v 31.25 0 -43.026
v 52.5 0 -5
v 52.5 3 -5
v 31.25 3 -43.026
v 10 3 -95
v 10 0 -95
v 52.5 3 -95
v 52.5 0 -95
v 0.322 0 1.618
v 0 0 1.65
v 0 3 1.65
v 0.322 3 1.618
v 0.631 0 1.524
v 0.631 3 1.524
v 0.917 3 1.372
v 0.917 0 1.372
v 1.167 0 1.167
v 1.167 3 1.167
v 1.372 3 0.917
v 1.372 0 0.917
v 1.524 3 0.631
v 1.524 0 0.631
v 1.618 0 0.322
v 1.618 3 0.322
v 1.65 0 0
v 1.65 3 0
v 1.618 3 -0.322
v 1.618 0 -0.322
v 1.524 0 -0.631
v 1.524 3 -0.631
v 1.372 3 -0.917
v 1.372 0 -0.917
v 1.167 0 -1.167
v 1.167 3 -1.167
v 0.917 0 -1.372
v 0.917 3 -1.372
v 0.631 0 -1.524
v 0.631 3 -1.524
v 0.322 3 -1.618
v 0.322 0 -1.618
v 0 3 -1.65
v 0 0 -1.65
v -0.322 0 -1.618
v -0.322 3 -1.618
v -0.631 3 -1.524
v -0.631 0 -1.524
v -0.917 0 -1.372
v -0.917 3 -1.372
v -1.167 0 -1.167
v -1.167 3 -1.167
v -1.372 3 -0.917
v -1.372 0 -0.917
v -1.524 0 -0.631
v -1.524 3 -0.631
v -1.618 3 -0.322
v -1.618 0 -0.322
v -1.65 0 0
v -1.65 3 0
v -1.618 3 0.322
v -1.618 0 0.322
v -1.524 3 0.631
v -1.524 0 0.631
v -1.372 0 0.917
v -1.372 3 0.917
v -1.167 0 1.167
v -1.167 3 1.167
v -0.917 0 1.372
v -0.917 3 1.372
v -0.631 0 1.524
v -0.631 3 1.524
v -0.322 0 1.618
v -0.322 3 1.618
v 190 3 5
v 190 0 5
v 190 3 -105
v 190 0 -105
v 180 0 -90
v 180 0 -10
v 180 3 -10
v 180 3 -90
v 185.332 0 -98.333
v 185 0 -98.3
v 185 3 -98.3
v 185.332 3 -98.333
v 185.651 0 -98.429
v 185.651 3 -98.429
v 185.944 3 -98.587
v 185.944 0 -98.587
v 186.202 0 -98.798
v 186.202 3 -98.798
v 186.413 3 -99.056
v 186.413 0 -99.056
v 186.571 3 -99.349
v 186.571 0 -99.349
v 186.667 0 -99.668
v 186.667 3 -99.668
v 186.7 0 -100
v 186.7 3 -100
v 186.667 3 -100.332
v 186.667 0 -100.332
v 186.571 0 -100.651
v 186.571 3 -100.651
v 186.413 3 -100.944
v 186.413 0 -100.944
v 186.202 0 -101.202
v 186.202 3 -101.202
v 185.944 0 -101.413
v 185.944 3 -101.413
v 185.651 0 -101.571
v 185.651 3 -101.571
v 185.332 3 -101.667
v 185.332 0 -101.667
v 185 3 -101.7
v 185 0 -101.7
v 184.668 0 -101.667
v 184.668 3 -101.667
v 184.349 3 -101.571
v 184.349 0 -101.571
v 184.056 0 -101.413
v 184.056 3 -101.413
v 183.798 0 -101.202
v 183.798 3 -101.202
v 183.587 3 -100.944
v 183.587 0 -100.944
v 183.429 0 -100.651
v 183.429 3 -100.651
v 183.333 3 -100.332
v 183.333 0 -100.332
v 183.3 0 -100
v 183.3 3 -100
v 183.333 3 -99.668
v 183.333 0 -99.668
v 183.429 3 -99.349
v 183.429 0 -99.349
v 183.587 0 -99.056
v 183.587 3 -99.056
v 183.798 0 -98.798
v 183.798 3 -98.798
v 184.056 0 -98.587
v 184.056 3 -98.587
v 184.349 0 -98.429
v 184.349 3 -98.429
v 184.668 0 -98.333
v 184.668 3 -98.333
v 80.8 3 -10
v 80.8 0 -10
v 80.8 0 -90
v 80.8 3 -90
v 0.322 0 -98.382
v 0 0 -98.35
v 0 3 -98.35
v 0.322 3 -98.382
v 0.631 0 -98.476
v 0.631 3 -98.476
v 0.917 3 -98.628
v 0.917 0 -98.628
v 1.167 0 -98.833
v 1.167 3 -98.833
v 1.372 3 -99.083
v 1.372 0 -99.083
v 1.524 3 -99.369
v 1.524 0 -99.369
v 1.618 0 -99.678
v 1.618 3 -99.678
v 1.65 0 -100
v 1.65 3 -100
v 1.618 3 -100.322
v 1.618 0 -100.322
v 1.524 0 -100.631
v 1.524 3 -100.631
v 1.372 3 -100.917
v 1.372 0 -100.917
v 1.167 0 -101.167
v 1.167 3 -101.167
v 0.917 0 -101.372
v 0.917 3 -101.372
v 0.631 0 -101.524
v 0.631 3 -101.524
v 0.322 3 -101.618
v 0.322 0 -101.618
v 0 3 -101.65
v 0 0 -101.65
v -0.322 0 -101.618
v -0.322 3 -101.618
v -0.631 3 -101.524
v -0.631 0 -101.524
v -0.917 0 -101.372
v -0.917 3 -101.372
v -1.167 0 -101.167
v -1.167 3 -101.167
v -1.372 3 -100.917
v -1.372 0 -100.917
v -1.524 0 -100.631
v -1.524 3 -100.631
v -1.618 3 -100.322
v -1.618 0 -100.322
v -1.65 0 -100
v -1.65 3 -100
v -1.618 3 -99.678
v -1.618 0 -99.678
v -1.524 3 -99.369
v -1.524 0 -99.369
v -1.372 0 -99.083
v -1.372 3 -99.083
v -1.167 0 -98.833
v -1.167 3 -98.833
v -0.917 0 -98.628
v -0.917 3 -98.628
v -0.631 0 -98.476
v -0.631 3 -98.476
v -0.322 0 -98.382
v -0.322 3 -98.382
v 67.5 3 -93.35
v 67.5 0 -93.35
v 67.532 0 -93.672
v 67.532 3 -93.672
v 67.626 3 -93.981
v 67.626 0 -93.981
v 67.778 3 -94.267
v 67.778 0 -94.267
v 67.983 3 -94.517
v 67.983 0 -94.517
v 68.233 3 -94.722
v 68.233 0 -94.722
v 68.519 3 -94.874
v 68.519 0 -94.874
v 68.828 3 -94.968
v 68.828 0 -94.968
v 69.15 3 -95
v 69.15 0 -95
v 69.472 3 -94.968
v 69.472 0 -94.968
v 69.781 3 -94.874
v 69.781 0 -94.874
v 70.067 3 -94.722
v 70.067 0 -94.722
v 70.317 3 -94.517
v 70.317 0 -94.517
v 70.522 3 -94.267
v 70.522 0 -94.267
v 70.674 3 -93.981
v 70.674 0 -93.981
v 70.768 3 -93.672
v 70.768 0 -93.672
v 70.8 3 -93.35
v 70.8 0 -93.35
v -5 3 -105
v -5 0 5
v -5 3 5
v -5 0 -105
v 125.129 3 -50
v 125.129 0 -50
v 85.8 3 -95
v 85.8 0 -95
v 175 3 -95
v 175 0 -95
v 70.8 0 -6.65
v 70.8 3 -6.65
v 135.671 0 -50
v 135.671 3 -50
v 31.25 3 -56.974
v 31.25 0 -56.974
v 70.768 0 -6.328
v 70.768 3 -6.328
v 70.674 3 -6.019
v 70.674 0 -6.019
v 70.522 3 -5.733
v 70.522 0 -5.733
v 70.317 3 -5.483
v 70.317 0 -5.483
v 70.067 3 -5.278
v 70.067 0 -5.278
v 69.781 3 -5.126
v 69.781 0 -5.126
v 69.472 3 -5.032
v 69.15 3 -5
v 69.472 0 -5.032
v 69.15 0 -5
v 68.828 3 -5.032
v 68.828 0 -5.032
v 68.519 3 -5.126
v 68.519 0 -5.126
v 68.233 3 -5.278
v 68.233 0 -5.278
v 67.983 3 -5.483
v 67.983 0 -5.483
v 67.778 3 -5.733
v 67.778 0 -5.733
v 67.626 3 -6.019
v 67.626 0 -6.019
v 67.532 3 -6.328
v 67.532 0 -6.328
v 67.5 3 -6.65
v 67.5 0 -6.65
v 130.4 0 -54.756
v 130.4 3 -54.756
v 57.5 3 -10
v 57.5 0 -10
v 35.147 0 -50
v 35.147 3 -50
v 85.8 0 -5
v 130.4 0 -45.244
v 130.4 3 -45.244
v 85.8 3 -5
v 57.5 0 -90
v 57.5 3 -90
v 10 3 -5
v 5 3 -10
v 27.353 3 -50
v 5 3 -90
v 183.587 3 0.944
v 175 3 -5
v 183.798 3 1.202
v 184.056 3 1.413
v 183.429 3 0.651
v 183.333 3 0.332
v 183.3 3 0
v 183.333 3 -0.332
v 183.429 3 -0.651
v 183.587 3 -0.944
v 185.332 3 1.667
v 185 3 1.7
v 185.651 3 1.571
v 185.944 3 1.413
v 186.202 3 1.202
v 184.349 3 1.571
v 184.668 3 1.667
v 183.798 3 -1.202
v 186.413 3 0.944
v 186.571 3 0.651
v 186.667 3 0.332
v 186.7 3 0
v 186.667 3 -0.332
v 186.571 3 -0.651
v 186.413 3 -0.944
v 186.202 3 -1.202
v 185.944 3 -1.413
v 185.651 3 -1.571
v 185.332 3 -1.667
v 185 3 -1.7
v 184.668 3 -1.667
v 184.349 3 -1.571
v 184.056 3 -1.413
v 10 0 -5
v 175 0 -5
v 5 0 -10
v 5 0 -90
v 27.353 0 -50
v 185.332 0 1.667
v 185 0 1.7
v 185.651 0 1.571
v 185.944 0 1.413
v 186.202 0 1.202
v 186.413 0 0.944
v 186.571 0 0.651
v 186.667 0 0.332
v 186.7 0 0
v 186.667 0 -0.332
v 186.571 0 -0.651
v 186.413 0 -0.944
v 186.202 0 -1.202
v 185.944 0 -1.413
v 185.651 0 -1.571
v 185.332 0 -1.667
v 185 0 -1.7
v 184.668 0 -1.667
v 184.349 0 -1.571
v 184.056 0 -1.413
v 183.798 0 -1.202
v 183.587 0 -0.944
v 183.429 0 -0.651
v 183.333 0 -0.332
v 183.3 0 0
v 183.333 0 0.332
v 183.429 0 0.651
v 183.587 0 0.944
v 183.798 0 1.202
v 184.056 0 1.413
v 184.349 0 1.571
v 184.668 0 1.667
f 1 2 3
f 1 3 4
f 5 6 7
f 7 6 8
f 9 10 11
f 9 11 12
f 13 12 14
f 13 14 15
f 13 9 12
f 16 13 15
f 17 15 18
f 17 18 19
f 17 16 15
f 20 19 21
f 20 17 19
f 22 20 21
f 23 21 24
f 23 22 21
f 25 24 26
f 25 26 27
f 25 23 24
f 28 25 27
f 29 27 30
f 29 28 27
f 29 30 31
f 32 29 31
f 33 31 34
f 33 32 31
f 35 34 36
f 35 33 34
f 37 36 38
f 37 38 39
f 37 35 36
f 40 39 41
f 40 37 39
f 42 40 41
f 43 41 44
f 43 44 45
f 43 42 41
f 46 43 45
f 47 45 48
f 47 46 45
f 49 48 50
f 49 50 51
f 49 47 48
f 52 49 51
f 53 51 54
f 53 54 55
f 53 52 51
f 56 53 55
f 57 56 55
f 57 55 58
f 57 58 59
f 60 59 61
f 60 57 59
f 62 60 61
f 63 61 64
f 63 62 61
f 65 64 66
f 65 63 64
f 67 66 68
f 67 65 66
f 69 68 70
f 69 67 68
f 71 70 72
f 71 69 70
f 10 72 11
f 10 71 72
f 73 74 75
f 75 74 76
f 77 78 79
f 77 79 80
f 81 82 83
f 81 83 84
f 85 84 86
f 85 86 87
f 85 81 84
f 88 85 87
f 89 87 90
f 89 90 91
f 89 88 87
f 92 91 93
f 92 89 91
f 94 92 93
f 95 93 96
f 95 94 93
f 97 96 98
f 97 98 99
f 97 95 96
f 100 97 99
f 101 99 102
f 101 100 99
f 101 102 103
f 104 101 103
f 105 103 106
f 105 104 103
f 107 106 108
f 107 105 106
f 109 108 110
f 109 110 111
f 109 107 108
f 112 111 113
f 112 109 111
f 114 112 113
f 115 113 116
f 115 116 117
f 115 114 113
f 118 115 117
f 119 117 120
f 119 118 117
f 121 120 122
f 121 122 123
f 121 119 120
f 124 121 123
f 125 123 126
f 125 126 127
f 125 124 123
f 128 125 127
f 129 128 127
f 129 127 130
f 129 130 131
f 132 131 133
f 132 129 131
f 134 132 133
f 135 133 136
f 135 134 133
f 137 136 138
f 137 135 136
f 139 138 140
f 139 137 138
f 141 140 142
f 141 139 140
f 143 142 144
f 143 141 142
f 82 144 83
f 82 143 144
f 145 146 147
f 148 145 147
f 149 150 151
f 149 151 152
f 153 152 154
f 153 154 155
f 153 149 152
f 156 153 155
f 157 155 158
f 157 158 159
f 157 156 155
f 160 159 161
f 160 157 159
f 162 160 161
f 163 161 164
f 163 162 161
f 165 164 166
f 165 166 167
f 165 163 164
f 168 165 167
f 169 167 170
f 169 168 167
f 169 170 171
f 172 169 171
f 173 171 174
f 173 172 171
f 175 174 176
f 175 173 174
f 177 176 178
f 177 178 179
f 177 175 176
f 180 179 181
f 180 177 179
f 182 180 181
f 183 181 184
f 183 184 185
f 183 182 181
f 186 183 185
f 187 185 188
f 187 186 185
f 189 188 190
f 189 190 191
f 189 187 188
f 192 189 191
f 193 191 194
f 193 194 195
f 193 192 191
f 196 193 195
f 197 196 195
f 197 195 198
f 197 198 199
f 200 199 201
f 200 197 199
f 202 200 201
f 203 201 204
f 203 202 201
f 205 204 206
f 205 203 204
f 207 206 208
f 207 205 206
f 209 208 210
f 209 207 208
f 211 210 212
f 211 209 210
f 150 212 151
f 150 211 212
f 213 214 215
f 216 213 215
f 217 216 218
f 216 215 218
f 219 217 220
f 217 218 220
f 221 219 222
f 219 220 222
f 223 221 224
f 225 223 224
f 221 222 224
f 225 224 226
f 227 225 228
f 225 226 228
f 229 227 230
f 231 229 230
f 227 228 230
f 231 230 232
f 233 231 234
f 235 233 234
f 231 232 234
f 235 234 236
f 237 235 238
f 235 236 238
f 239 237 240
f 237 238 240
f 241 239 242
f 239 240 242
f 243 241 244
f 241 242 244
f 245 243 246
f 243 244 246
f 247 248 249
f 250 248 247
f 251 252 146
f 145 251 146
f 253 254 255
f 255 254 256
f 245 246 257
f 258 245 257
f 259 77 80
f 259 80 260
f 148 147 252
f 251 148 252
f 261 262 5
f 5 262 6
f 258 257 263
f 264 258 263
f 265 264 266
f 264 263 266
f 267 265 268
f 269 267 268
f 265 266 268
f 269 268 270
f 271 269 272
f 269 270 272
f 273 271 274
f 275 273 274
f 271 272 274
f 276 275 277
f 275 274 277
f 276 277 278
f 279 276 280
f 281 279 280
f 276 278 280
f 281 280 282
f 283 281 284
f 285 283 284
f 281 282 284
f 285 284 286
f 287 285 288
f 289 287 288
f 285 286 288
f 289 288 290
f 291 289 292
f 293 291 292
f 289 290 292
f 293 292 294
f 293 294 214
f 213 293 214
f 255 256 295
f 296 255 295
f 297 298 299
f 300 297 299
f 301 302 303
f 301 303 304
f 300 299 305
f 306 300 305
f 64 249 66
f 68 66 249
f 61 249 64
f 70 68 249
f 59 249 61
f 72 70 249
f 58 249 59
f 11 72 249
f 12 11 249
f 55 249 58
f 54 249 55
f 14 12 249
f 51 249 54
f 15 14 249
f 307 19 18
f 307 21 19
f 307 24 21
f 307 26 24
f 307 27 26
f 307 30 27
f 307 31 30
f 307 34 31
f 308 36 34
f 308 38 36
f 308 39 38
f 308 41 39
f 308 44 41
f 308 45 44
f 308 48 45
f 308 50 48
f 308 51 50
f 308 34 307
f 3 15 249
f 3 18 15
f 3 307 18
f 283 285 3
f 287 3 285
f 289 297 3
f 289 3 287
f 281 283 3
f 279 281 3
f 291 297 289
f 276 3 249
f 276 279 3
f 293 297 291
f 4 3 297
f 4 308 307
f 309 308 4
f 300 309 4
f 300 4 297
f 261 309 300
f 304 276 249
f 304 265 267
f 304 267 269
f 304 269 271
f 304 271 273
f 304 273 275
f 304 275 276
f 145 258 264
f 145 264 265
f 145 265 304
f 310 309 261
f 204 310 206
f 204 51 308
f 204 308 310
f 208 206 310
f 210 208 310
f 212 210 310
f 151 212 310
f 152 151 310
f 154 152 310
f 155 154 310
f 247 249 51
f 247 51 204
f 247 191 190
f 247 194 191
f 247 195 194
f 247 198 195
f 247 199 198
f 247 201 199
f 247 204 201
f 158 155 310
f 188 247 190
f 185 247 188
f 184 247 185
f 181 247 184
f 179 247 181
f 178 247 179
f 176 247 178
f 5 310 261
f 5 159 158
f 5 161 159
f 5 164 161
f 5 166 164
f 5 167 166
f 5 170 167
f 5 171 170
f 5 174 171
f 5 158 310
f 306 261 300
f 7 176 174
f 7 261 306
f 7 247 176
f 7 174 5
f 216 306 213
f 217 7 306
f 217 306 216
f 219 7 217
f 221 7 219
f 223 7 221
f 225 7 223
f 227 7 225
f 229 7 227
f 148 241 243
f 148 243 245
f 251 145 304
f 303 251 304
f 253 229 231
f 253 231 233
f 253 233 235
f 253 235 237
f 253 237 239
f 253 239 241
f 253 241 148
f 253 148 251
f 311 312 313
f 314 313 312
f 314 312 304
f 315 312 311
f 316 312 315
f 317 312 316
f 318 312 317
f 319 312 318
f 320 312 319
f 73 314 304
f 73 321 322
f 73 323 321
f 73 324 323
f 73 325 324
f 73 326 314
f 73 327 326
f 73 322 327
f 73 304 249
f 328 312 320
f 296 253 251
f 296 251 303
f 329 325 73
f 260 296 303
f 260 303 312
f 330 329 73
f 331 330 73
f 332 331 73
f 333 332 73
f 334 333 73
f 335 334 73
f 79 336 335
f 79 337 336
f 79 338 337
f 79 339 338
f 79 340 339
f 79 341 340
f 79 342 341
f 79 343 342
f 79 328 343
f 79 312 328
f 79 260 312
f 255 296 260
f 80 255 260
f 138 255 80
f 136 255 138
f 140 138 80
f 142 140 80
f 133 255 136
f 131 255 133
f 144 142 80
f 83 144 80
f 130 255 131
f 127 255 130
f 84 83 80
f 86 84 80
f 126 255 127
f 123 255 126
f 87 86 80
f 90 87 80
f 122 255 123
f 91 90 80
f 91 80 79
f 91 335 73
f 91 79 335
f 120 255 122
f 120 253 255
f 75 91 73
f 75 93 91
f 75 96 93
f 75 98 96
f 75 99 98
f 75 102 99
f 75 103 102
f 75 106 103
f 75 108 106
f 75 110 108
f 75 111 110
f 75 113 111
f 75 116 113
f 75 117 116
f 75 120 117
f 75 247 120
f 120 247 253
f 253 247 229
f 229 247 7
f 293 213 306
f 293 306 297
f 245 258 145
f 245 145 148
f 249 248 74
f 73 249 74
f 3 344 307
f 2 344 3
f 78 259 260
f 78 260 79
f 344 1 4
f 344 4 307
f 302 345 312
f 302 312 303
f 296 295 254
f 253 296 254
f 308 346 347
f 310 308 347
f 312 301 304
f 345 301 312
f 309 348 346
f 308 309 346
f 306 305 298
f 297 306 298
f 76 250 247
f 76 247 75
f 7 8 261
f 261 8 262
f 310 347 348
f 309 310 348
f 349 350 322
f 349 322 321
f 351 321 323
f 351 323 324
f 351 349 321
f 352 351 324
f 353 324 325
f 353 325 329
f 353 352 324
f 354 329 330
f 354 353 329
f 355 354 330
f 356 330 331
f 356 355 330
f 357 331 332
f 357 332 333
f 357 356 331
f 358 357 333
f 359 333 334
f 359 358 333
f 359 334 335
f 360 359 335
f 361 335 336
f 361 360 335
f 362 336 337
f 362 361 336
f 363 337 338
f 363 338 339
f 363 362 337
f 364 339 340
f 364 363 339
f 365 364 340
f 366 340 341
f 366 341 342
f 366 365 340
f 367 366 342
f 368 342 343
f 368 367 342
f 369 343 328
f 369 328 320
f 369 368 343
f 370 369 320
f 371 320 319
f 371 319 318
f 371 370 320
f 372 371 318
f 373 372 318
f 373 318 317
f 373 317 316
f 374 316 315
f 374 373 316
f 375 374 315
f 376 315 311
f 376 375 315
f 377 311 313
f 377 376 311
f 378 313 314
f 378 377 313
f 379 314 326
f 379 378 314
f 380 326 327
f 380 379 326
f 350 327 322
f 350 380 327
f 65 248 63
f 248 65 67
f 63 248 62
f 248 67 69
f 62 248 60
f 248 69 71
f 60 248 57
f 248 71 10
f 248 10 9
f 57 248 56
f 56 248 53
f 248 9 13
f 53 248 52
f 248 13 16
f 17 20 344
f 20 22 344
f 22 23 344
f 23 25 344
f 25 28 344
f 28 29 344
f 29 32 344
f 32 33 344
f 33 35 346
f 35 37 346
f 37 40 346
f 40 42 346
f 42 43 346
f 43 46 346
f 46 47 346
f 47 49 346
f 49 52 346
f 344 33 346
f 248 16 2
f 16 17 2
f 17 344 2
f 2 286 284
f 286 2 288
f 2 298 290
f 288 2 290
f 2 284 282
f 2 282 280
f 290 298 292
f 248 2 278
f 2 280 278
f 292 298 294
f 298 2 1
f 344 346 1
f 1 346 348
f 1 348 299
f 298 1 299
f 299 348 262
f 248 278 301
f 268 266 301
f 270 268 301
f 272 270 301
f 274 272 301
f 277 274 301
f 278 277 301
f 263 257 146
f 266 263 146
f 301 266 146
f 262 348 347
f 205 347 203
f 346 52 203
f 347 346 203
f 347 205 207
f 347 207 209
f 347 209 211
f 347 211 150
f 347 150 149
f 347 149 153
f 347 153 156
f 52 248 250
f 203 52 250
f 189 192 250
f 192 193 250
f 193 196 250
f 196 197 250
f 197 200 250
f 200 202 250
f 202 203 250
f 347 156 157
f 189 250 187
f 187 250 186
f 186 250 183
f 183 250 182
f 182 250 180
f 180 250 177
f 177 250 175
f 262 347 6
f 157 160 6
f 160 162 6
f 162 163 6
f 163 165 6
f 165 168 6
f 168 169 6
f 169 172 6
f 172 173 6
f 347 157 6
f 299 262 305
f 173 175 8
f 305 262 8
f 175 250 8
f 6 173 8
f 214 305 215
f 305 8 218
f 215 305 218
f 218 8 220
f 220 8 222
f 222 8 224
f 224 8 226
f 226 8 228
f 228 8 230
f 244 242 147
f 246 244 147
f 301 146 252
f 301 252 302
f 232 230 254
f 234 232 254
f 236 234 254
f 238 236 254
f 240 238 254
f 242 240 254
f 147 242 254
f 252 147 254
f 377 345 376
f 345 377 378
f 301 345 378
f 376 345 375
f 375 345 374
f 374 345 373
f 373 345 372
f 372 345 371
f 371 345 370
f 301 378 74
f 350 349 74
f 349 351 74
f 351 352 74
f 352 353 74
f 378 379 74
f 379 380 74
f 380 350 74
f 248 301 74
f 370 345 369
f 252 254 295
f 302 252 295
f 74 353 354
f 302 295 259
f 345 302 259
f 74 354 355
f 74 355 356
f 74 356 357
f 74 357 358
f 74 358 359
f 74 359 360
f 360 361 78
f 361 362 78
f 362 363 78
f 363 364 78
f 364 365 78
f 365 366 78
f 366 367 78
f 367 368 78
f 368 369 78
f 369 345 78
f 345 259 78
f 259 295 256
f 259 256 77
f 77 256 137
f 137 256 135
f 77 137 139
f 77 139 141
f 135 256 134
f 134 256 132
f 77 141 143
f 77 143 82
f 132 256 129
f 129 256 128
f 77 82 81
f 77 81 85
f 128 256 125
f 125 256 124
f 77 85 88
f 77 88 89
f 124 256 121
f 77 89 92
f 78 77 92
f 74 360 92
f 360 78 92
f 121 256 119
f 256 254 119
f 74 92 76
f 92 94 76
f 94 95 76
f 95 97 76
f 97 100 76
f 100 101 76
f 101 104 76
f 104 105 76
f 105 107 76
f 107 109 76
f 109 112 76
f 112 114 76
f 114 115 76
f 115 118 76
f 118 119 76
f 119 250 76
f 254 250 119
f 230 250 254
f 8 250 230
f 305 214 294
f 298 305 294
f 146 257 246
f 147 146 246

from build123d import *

# Parameters (mm, degrees)
SKETCH_1_W      = 195
SKETCH_1_H      = 110
SKETCH_1_R      = 1.65
SKETCH_1_R_2    = 1.7
EXTRUDE_1_DEPTH = 3


with BuildPart() as part:
    # 草图1 → 凸台-拉伸1 (new body)
    with BuildSketch(Plane(origin=(0, 0, 0), x_dir=(1, 0, 0), z_dir=(0, 1, 0))):
        with Locations((92.5, 50)):
            Rectangle(SKETCH_1_W, SKETCH_1_H)
        with Locations(Location((0, 0, 0), (0, 0, 270))):
            Circle(SKETCH_1_R, mode=Mode.SUBTRACT)
        with Locations(Location((0, 100, 0), (0, 0, 270))):
            Circle(SKETCH_1_R, mode=Mode.SUBTRACT)
        with Locations(Location((185, 100, 0), (0, 0, 270))):
            Circle(SKETCH_1_R_2, mode=Mode.SUBTRACT)
        with Locations(Location((185, 0, 0), (0, 0, 270))):
            Circle(SKETCH_1_R_2, mode=Mode.SUBTRACT)
        with BuildLine():
            Line((67.5, 6.65), (67.5, 93.35))
            ThreePointArc((67.5, 93.35), (69.15, 95), (70.8, 93.35))
            Line((70.8, 93.35), (70.8, 6.65))
            ThreePointArc((70.8, 6.65), (69.15, 5), (67.5, 6.65))
        make_face(mode=Mode.SUBTRACT)
        Polygon((5, 90), (27.352941176, 50), (5, 10), align=None, mode=Mode.SUBTRACT)
        Polygon((10, 95), (52.5, 95), (31.25, 56.973684211), align=None, mode=Mode.SUBTRACT)
        Polygon((10, 5), (52.5, 5), (31.25, 43.026315789), align=None, mode=Mode.SUBTRACT)
        Polygon((57.5, 90), (57.5, 10), (35.147058824, 50), align=None, mode=Mode.SUBTRACT)
        Polygon((85.8, 5), (175, 5), (130.4, 45.244161359), align=None, mode=Mode.SUBTRACT)
        Polygon((80.8, 10), (80.8, 90), (125.129411765, 50), align=None, mode=Mode.SUBTRACT)
        Polygon((85.8, 95), (175, 95), (130.4, 54.755838641), align=None, mode=Mode.SUBTRACT)
        Polygon((180, 10), (180, 90), (135.670588235, 50), align=None, mode=Mode.SUBTRACT)
    extrude(amount=EXTRUDE_1_DEPTH)


solid = part.part
